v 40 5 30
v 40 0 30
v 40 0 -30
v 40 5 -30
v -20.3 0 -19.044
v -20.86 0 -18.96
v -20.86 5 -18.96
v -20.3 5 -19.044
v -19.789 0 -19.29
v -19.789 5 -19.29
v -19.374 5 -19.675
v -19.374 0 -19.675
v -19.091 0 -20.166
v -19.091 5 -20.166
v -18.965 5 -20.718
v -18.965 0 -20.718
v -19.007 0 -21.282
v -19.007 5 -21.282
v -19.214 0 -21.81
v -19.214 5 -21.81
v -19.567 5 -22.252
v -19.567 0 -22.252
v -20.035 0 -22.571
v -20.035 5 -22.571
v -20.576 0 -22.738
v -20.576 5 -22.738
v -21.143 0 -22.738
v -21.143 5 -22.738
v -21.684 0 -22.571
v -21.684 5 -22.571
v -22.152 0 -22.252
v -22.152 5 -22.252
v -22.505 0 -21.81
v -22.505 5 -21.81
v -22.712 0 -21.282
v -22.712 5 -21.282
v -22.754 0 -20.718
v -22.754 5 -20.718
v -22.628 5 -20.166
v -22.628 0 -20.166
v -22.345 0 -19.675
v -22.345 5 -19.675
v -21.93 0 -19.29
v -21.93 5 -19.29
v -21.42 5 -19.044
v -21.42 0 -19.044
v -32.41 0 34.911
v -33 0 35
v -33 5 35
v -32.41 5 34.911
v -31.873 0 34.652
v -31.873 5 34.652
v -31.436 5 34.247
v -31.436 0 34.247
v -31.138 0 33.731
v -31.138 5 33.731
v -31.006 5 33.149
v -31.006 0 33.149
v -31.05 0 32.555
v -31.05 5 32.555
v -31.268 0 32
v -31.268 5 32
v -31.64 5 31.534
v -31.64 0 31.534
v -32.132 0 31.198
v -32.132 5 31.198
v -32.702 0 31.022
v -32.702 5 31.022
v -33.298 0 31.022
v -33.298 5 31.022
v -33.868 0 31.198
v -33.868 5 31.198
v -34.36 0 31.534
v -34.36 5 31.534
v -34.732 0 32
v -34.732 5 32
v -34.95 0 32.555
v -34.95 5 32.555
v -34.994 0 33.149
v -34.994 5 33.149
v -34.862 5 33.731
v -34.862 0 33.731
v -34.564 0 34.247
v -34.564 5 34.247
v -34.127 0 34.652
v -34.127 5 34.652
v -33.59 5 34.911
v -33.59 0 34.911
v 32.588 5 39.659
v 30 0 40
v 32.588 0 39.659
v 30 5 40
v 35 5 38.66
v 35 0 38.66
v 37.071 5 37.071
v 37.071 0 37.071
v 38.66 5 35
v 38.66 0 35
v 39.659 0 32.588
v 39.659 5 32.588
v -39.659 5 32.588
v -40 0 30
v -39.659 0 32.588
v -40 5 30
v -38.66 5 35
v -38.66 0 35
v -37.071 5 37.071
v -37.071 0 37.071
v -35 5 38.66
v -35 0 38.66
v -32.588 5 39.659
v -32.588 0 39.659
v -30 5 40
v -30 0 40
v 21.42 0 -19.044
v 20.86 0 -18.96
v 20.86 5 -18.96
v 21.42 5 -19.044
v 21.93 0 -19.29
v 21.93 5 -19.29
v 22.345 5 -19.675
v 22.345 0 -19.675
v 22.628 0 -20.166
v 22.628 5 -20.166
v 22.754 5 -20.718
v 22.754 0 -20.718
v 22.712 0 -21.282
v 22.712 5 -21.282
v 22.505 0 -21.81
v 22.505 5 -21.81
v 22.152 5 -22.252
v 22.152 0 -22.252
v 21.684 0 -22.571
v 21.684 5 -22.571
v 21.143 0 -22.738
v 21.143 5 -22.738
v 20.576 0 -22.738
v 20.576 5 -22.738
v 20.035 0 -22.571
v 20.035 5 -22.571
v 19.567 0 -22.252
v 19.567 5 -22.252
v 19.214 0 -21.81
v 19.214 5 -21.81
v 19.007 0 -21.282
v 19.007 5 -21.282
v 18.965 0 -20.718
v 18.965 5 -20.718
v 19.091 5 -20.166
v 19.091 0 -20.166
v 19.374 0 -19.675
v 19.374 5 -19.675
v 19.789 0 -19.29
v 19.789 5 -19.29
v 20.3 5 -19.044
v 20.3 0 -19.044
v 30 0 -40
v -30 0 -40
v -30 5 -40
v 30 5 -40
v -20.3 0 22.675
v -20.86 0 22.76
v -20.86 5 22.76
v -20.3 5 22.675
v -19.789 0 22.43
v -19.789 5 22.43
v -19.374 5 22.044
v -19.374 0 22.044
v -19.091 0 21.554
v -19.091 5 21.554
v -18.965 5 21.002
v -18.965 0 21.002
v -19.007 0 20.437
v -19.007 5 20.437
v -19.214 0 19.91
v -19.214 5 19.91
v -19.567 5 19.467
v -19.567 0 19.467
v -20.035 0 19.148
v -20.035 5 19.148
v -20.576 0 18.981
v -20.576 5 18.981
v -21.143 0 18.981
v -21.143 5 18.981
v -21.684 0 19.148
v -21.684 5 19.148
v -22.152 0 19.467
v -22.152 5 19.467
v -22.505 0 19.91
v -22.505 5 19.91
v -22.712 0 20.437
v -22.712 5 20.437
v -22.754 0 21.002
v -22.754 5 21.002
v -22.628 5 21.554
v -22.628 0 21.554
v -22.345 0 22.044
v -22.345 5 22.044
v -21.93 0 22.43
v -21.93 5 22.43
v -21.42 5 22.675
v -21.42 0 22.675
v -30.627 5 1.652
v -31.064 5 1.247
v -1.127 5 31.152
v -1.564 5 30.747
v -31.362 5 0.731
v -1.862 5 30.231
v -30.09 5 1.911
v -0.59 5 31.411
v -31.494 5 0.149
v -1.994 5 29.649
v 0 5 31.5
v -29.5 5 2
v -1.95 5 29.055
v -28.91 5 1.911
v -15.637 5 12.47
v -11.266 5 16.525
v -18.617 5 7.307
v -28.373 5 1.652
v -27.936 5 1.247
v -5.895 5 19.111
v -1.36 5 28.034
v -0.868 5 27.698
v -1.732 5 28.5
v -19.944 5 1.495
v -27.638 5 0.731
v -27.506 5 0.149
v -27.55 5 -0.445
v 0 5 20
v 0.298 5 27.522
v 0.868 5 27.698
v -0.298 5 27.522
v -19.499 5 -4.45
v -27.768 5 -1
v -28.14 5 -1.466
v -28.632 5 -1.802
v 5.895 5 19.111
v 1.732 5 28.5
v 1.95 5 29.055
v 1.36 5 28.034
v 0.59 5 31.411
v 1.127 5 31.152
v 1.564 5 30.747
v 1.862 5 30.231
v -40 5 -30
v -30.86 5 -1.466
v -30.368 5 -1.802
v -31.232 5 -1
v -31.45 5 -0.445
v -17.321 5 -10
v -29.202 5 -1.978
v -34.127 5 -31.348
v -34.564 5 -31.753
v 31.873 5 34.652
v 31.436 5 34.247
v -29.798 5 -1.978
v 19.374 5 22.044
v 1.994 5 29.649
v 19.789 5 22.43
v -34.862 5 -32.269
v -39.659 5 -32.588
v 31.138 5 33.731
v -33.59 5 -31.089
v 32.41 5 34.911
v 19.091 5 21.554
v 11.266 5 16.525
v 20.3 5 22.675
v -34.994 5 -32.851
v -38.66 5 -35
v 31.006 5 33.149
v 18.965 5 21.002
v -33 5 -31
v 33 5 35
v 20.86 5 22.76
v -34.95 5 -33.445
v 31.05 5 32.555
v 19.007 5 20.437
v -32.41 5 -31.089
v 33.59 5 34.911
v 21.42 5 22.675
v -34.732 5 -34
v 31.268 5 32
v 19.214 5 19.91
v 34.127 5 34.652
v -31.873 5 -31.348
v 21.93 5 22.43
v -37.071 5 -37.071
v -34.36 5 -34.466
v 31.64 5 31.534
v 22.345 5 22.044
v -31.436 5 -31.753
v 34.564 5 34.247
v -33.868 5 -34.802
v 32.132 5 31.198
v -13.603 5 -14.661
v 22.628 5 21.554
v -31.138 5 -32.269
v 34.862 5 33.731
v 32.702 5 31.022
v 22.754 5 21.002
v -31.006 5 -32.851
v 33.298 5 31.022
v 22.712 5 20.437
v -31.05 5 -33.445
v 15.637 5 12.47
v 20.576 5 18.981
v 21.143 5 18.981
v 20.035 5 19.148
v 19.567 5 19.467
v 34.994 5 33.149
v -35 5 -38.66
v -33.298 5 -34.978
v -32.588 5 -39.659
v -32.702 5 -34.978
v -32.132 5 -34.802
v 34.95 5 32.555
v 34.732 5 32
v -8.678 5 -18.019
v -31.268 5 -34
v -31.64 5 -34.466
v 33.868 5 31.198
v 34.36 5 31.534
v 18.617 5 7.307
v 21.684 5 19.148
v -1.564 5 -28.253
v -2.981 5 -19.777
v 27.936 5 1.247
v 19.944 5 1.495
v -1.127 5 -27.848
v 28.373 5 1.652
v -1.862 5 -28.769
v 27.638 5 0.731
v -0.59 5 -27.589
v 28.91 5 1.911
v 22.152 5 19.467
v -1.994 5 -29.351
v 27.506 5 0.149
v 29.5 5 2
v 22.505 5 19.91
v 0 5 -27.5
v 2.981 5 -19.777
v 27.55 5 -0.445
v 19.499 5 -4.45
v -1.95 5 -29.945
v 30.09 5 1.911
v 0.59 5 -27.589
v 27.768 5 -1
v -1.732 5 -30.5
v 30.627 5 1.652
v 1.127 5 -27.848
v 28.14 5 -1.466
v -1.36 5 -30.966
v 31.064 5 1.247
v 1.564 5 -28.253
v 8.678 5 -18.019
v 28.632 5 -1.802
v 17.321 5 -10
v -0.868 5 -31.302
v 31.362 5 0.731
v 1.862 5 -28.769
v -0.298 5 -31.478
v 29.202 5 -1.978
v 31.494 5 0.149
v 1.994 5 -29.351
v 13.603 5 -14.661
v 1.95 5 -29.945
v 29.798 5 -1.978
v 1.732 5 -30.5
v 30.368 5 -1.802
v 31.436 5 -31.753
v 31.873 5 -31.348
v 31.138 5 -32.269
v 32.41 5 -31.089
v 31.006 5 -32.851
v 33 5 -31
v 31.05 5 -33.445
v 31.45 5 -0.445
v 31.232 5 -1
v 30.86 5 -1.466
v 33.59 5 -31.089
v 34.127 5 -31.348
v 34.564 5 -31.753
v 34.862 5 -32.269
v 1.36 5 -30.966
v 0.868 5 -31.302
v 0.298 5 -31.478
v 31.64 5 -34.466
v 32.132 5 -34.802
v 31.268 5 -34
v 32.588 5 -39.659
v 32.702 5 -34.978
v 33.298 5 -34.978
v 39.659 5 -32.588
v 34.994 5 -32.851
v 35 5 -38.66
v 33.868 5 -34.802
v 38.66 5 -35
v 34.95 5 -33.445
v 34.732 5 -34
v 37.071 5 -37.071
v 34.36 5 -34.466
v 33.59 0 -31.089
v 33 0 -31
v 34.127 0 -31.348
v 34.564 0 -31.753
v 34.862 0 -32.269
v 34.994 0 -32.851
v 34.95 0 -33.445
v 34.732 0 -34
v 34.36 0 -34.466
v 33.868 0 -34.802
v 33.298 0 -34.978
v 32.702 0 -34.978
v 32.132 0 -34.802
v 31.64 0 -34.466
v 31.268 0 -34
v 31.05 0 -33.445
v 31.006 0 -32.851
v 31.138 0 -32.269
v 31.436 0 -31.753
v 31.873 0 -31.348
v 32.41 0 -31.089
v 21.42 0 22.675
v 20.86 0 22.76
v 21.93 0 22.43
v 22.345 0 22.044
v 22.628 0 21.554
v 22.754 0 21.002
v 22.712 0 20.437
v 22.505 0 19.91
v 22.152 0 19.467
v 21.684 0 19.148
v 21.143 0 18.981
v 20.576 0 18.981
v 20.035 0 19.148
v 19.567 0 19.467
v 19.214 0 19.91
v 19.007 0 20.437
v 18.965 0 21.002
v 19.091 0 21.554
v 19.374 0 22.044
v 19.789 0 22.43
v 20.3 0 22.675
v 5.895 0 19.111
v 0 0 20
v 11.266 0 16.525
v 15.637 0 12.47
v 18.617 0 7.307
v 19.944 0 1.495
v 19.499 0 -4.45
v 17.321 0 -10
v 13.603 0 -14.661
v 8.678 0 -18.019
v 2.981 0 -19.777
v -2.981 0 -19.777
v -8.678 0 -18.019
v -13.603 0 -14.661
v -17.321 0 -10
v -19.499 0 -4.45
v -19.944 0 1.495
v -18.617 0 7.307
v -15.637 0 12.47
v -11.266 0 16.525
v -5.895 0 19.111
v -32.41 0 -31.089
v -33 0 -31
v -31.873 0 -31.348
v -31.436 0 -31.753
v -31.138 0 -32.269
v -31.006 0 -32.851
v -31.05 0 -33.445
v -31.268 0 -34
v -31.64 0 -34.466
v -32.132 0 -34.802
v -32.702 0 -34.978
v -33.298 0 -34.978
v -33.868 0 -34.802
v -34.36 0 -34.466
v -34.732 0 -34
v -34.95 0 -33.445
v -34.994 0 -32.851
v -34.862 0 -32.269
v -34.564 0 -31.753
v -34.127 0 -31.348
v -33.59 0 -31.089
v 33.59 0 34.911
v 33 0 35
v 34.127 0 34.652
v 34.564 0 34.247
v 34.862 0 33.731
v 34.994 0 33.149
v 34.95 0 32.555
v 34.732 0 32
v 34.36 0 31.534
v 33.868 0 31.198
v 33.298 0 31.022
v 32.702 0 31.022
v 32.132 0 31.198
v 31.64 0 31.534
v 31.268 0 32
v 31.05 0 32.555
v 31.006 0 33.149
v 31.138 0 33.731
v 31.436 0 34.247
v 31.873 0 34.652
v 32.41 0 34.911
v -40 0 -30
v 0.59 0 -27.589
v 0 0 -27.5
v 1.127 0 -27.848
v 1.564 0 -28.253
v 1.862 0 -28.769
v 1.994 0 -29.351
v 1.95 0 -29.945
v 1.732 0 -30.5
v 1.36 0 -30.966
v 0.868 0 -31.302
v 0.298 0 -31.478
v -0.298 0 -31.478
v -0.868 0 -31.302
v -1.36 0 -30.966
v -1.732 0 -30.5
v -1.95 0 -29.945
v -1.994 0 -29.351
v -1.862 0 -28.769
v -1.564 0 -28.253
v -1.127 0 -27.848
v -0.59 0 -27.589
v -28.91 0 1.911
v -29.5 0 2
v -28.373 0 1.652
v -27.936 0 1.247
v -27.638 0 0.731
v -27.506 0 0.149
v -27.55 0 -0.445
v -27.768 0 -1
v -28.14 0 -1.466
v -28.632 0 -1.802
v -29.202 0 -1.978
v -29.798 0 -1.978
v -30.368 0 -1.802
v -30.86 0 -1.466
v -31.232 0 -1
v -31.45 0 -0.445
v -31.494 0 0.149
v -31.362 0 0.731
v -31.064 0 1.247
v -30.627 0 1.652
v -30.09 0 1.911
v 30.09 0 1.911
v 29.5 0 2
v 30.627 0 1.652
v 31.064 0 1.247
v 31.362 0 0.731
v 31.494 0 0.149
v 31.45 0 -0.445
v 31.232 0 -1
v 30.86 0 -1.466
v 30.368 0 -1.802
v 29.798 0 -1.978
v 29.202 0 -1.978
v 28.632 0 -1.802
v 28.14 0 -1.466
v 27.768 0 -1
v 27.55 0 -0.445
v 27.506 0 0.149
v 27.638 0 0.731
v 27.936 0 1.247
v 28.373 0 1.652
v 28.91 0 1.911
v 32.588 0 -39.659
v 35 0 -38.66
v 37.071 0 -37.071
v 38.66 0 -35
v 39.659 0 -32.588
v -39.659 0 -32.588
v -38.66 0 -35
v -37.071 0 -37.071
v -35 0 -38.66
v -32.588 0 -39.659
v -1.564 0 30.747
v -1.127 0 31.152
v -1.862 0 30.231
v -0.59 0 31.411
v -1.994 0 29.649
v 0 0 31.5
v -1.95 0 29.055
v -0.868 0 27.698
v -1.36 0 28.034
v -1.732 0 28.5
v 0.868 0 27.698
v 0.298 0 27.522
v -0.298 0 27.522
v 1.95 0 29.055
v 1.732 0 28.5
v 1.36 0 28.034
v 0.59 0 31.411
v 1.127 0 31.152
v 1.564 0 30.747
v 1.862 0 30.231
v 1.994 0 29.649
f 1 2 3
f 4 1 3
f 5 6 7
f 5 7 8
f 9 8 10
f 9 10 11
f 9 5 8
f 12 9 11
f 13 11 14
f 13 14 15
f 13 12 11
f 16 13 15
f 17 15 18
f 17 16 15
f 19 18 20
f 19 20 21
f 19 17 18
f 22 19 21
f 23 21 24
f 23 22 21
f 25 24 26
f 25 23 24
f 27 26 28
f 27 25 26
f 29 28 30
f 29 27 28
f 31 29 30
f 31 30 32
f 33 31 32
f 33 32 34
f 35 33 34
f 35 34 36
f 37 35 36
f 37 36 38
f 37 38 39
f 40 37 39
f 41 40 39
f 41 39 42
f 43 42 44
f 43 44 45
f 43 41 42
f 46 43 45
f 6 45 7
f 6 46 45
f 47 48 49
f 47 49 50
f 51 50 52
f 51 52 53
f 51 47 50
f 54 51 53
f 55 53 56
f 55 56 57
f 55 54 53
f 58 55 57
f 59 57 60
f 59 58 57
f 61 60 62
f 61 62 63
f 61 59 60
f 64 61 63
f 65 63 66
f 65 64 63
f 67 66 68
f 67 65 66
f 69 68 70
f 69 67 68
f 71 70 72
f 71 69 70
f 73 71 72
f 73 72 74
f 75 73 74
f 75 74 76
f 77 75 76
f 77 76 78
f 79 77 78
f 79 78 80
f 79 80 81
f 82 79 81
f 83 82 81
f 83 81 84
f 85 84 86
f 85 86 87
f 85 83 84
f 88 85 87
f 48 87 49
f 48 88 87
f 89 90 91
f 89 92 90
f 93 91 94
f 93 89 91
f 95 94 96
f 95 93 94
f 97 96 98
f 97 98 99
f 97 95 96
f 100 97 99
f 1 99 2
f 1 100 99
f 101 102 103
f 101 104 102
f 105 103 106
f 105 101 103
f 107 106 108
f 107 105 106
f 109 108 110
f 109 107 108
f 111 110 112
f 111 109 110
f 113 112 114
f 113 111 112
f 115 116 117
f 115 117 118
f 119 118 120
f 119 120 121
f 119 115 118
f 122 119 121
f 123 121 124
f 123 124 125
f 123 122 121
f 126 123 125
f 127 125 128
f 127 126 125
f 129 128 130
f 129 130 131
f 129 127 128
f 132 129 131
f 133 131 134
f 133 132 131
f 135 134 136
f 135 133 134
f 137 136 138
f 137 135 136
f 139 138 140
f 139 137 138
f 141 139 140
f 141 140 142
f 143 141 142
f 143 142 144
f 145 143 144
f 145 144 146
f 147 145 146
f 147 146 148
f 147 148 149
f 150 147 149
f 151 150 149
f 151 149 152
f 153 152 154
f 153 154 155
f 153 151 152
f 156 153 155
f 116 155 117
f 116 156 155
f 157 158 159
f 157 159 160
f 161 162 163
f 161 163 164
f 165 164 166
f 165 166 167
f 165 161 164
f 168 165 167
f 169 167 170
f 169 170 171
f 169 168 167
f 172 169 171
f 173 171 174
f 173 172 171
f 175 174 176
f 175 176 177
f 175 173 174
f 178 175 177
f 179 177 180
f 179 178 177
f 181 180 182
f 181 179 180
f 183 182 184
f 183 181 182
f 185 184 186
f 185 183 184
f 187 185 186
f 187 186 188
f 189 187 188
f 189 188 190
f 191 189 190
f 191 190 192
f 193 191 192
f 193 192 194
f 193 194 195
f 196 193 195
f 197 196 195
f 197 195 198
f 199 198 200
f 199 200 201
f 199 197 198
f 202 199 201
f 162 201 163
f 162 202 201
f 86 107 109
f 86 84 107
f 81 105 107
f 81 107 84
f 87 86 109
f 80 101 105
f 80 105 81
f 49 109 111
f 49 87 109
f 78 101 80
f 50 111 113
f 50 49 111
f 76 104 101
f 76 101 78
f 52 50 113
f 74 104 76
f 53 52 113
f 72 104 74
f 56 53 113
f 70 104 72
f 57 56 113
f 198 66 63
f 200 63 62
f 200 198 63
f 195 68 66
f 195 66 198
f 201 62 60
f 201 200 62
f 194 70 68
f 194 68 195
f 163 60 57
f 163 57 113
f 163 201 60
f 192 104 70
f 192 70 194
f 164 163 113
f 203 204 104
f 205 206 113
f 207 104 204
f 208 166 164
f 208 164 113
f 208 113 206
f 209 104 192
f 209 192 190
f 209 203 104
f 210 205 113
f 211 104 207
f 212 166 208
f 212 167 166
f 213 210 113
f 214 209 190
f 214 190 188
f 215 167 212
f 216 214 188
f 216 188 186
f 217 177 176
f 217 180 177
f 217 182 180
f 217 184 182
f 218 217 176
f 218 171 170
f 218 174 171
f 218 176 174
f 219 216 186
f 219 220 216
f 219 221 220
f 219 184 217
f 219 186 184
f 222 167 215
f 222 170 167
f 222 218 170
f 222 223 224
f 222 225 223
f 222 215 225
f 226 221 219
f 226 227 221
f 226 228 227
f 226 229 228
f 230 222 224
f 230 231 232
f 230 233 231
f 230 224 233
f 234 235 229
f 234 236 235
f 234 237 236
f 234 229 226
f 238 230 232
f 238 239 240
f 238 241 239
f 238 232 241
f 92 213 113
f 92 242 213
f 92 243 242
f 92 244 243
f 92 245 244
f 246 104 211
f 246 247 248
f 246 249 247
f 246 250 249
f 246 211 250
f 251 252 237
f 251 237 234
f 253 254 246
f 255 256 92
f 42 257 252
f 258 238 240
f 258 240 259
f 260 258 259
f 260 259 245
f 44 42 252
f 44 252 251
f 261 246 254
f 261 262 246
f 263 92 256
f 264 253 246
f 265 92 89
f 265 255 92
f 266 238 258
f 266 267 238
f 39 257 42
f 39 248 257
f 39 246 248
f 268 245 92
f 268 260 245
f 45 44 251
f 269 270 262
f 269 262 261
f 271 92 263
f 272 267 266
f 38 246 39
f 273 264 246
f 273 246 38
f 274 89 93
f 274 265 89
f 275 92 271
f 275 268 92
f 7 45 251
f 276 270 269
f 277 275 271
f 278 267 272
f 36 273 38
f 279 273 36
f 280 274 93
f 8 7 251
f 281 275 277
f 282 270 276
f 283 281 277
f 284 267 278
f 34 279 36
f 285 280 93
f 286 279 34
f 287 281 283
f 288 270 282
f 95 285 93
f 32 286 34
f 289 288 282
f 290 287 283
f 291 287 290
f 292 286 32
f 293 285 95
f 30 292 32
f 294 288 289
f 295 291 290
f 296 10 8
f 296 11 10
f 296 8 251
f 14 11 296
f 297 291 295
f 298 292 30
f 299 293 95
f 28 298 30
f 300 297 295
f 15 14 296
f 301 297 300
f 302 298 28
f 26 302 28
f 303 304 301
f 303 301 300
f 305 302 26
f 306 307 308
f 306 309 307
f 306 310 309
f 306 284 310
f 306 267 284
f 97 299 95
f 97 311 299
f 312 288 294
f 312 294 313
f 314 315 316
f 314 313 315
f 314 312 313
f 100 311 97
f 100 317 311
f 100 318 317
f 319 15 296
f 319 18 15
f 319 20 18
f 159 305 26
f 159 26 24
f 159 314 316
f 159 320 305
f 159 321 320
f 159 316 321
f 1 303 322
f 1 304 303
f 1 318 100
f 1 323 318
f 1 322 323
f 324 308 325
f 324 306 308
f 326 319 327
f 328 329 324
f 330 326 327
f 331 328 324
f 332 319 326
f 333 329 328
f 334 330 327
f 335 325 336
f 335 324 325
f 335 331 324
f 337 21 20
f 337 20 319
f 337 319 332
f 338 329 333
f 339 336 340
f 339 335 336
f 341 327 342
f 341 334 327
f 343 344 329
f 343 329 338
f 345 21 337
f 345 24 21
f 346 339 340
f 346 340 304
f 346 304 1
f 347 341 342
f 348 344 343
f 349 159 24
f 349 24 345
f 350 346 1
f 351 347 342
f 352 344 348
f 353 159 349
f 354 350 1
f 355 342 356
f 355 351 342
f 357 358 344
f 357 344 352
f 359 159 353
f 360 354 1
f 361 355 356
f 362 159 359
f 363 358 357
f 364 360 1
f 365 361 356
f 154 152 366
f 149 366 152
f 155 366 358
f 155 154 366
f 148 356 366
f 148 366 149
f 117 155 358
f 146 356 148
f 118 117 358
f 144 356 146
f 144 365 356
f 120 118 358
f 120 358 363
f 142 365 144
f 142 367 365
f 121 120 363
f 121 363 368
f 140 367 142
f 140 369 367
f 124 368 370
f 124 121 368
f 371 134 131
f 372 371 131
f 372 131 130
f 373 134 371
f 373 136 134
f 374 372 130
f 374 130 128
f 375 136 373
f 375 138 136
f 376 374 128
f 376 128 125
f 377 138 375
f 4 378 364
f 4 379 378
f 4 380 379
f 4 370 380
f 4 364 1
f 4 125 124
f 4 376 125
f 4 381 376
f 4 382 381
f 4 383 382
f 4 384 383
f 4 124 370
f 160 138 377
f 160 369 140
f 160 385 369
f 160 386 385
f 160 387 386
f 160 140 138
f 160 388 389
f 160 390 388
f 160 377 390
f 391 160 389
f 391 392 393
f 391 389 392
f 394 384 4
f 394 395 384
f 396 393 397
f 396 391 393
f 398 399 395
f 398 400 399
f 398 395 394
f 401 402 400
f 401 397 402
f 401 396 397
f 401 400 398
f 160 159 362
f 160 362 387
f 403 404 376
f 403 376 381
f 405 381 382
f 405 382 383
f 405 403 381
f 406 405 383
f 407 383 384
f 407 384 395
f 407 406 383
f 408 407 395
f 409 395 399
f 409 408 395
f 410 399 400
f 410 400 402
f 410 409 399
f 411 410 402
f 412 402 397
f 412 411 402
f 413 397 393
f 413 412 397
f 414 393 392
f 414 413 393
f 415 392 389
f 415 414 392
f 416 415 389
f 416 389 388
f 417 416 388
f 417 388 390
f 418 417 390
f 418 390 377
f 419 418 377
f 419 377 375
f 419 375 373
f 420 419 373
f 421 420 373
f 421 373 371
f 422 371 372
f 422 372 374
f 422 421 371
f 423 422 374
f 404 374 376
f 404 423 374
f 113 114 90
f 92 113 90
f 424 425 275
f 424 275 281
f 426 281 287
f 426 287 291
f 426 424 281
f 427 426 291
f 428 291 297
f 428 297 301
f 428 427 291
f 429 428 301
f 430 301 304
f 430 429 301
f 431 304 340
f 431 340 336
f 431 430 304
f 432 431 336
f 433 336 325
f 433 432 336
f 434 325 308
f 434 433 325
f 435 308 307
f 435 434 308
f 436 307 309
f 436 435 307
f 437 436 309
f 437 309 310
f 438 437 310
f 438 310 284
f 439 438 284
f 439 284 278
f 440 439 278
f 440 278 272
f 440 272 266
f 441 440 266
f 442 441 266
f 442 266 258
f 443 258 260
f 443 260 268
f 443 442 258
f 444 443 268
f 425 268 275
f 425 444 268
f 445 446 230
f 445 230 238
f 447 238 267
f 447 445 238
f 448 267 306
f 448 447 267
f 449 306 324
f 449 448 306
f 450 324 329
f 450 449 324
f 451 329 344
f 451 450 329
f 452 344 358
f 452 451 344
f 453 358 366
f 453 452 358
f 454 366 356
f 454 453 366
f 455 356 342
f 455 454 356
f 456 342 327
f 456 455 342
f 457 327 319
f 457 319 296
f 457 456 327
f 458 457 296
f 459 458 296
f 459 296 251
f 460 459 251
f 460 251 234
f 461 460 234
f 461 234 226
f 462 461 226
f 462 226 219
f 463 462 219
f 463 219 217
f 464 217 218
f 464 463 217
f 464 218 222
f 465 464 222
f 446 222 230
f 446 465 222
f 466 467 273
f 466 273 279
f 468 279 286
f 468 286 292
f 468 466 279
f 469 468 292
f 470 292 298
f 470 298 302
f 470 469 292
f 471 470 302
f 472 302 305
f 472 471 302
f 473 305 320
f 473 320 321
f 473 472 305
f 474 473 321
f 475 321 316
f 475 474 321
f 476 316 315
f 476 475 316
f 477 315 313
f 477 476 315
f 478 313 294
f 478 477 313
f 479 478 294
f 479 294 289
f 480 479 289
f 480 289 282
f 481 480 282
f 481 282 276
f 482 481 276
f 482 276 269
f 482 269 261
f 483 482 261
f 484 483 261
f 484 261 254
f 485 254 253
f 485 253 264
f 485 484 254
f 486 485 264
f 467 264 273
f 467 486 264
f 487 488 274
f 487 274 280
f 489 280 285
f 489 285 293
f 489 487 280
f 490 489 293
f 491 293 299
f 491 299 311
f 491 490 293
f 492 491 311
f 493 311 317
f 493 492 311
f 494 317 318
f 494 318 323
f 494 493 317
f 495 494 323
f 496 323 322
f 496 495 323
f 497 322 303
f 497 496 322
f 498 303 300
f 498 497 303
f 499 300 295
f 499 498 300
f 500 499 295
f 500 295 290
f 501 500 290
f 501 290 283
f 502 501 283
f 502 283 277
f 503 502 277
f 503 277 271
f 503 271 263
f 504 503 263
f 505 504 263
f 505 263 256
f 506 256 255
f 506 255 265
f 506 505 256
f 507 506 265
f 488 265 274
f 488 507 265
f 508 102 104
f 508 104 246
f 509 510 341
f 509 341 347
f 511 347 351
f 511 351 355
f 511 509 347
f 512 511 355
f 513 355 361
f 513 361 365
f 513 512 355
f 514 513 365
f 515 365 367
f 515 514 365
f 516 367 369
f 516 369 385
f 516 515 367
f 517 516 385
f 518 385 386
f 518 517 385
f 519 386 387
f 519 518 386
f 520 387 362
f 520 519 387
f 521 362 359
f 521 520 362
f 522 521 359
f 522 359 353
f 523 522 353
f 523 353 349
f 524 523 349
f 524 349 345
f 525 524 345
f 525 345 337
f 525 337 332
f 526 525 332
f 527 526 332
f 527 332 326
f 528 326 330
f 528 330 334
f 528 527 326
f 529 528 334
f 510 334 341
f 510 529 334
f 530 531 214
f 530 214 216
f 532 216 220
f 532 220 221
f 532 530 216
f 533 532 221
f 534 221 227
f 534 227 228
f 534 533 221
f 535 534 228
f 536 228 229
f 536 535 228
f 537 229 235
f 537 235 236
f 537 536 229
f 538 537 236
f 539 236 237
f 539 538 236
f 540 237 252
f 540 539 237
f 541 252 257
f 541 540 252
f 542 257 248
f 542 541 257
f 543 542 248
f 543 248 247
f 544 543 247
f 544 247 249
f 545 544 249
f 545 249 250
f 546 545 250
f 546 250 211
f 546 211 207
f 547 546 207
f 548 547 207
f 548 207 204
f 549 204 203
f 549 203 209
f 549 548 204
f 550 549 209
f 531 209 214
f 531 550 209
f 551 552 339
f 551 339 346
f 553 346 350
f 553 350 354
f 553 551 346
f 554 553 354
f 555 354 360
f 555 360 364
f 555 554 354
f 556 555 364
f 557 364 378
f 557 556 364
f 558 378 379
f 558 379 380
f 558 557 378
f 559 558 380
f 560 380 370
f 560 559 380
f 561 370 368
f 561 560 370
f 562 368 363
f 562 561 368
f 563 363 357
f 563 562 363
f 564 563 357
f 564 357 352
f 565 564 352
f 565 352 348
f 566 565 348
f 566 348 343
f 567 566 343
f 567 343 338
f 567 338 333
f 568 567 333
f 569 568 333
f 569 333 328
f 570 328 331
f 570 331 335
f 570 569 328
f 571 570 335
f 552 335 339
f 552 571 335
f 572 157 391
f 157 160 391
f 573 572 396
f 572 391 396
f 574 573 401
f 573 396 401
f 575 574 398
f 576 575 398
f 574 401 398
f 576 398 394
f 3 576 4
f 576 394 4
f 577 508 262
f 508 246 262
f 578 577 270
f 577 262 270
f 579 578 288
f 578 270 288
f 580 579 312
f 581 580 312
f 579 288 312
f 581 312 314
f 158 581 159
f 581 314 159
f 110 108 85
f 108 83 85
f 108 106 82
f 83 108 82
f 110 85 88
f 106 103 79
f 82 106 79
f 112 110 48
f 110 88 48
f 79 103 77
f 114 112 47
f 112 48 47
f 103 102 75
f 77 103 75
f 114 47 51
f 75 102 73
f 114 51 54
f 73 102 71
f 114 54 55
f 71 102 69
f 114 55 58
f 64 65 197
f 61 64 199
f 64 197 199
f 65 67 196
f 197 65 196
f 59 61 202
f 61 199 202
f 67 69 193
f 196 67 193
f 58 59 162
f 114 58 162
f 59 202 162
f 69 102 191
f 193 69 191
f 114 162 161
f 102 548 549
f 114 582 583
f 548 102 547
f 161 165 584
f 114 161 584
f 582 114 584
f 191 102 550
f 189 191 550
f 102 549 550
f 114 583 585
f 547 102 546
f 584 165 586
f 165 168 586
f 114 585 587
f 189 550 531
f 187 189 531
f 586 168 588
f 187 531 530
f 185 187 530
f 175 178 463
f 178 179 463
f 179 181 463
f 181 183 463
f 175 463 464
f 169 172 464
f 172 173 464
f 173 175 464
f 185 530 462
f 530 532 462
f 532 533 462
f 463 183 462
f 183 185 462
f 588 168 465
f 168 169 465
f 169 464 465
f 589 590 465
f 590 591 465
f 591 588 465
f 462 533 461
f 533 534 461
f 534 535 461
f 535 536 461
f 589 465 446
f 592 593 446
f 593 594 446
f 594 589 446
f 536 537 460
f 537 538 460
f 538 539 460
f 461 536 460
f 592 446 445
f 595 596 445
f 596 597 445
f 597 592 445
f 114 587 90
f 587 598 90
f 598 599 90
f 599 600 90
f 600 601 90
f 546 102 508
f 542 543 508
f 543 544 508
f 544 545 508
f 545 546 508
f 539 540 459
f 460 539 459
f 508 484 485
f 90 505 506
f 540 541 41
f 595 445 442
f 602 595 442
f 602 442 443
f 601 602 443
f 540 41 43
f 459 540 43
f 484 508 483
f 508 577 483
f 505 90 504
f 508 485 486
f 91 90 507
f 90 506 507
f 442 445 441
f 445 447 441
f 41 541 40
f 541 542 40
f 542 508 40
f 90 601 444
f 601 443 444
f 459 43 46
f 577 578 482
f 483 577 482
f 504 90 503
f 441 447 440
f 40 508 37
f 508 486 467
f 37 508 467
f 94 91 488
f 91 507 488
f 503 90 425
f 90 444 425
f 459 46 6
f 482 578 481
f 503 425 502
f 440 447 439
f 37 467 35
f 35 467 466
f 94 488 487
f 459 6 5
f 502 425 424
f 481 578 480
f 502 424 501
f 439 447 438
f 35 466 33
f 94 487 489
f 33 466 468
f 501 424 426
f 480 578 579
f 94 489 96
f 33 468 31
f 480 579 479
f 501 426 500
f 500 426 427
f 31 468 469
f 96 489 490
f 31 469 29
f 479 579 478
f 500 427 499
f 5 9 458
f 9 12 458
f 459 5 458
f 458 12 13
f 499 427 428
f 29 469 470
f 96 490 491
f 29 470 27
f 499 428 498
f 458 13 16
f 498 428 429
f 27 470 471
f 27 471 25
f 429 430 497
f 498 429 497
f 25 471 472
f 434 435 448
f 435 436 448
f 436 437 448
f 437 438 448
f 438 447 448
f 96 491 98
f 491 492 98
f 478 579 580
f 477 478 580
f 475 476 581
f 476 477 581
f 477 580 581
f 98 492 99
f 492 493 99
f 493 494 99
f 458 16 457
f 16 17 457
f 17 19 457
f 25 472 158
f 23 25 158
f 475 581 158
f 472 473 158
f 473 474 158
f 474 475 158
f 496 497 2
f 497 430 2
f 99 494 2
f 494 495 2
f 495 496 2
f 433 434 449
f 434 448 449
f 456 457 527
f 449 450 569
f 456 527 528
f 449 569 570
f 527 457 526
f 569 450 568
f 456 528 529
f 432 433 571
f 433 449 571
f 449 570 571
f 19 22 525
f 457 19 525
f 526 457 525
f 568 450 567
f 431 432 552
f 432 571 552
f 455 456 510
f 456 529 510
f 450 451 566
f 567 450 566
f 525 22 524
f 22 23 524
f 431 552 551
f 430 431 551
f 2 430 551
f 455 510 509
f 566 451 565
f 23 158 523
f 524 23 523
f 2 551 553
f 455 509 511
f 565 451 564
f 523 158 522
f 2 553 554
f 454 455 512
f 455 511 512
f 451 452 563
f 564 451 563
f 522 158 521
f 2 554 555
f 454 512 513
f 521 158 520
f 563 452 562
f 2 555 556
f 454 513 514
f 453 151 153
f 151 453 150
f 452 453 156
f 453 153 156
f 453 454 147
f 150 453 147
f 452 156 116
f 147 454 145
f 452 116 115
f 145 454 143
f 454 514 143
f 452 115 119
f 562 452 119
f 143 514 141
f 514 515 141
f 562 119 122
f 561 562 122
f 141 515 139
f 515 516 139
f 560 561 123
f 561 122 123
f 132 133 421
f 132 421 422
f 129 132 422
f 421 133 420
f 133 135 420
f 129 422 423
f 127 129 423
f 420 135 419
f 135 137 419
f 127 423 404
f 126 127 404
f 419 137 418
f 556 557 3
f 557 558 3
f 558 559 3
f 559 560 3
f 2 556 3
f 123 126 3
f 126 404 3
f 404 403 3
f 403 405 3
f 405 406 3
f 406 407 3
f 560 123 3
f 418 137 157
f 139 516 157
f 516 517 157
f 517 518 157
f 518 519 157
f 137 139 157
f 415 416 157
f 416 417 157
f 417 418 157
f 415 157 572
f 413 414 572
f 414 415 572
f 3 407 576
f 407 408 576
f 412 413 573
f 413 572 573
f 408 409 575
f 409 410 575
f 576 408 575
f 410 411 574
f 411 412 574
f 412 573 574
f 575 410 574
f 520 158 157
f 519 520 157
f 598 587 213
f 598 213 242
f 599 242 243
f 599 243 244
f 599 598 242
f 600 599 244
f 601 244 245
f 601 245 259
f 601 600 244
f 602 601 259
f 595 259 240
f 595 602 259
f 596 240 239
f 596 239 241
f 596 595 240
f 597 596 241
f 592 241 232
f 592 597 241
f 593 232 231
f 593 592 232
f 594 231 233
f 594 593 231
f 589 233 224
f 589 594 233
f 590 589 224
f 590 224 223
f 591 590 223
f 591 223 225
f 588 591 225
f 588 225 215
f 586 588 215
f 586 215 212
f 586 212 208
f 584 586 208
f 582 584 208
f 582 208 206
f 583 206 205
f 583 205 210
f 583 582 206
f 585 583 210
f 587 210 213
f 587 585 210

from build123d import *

# Parameters (mm, degrees)
SKETCH_1_W      = 80
SKETCH_1_H      = 80
SKETCH_1_R      = 1.9
SKETCH_1_R_2    = 2
SKETCH_1_R_3    = 20
EXTRUDE_1_DEPTH = 5
FILLET_5_R      = 10


with BuildPart() as part:
    # Эскиз1 → Бобышка-Вытянуть1 (new body)
    with BuildSketch(Plane(origin=(0, 0, 0), x_dir=(1, 0, 0), z_dir=(0, 1, 0))):
        Rectangle(SKETCH_1_W, SKETCH_1_H)
        with Locations(Location((20.859650045, 20.859650045, 0), (0, 0, 270))):
            Circle(SKETCH_1_R, mode=Mode.SUBTRACT)
        with Locations(Location((20.859650045, -20.859650045, 0), (0, 0, 270))):
            Circle(SKETCH_1_R, mode=Mode.SUBTRACT)
        with Locations(Location((-20.859650045, -20.859650045, 0), (0, 0, 270))):
            Circle(SKETCH_1_R, mode=Mode.SUBTRACT)
        with Locations(Location((-20.859650045, 20.859650045, 0), (0, 0, 270))):
            Circle(SKETCH_1_R, mode=Mode.SUBTRACT)
        with Locations(Location((-33, 33, 0), (0, 0, 270))):
            Circle(SKETCH_1_R_2, mode=Mode.SUBTRACT)
        with Locations(Location((33, 33, 0), (0, 0, 270))):
            Circle(SKETCH_1_R_2, mode=Mode.SUBTRACT)
        with Locations(Location((33, -33, 0), (0, 0, 270))):
            Circle(SKETCH_1_R_2, mode=Mode.SUBTRACT)
        with Locations(Location((-33, -33, 0), (0, 0, 270))):
            Circle(SKETCH_1_R_2, mode=Mode.SUBTRACT)
        with Locations(Location((0, 0, 0), (0, 0, 270))):
            Circle(SKETCH_1_R_3, mode=Mode.SUBTRACT)
        with Locations(Location((0, 29.5, 0), (0, 0, 270))):
            Circle(SKETCH_1_R_2, mode=Mode.SUBTRACT)
        with Locations(Location((29.5, 0, 0), (0, 0, 270))):
            Circle(SKETCH_1_R_2, mode=Mode.SUBTRACT)
        with Locations(Location((0, -29.5, 0), (0, 0, 270))):
            Circle(SKETCH_1_R_2, mode=Mode.SUBTRACT)
        with Locations(Location((-29.5, 0, 0), (0, 0, 270))):
            Circle(SKETCH_1_R_2, mode=Mode.SUBTRACT)
    extrude(amount=EXTRUDE_1_DEPTH)

    # Скругление5
    fillet_5_edges = [part.edges().sort_by_distance(p)[0] for p in [
        (40, 2.5, 40),
        (-40, 2.5, 40),
        (-40, 2.5, -40),
        (40, 2.5, -40),
    ]]
    fillet(fillet_5_edges, radius=FILLET_5_R)


solid = part.part
